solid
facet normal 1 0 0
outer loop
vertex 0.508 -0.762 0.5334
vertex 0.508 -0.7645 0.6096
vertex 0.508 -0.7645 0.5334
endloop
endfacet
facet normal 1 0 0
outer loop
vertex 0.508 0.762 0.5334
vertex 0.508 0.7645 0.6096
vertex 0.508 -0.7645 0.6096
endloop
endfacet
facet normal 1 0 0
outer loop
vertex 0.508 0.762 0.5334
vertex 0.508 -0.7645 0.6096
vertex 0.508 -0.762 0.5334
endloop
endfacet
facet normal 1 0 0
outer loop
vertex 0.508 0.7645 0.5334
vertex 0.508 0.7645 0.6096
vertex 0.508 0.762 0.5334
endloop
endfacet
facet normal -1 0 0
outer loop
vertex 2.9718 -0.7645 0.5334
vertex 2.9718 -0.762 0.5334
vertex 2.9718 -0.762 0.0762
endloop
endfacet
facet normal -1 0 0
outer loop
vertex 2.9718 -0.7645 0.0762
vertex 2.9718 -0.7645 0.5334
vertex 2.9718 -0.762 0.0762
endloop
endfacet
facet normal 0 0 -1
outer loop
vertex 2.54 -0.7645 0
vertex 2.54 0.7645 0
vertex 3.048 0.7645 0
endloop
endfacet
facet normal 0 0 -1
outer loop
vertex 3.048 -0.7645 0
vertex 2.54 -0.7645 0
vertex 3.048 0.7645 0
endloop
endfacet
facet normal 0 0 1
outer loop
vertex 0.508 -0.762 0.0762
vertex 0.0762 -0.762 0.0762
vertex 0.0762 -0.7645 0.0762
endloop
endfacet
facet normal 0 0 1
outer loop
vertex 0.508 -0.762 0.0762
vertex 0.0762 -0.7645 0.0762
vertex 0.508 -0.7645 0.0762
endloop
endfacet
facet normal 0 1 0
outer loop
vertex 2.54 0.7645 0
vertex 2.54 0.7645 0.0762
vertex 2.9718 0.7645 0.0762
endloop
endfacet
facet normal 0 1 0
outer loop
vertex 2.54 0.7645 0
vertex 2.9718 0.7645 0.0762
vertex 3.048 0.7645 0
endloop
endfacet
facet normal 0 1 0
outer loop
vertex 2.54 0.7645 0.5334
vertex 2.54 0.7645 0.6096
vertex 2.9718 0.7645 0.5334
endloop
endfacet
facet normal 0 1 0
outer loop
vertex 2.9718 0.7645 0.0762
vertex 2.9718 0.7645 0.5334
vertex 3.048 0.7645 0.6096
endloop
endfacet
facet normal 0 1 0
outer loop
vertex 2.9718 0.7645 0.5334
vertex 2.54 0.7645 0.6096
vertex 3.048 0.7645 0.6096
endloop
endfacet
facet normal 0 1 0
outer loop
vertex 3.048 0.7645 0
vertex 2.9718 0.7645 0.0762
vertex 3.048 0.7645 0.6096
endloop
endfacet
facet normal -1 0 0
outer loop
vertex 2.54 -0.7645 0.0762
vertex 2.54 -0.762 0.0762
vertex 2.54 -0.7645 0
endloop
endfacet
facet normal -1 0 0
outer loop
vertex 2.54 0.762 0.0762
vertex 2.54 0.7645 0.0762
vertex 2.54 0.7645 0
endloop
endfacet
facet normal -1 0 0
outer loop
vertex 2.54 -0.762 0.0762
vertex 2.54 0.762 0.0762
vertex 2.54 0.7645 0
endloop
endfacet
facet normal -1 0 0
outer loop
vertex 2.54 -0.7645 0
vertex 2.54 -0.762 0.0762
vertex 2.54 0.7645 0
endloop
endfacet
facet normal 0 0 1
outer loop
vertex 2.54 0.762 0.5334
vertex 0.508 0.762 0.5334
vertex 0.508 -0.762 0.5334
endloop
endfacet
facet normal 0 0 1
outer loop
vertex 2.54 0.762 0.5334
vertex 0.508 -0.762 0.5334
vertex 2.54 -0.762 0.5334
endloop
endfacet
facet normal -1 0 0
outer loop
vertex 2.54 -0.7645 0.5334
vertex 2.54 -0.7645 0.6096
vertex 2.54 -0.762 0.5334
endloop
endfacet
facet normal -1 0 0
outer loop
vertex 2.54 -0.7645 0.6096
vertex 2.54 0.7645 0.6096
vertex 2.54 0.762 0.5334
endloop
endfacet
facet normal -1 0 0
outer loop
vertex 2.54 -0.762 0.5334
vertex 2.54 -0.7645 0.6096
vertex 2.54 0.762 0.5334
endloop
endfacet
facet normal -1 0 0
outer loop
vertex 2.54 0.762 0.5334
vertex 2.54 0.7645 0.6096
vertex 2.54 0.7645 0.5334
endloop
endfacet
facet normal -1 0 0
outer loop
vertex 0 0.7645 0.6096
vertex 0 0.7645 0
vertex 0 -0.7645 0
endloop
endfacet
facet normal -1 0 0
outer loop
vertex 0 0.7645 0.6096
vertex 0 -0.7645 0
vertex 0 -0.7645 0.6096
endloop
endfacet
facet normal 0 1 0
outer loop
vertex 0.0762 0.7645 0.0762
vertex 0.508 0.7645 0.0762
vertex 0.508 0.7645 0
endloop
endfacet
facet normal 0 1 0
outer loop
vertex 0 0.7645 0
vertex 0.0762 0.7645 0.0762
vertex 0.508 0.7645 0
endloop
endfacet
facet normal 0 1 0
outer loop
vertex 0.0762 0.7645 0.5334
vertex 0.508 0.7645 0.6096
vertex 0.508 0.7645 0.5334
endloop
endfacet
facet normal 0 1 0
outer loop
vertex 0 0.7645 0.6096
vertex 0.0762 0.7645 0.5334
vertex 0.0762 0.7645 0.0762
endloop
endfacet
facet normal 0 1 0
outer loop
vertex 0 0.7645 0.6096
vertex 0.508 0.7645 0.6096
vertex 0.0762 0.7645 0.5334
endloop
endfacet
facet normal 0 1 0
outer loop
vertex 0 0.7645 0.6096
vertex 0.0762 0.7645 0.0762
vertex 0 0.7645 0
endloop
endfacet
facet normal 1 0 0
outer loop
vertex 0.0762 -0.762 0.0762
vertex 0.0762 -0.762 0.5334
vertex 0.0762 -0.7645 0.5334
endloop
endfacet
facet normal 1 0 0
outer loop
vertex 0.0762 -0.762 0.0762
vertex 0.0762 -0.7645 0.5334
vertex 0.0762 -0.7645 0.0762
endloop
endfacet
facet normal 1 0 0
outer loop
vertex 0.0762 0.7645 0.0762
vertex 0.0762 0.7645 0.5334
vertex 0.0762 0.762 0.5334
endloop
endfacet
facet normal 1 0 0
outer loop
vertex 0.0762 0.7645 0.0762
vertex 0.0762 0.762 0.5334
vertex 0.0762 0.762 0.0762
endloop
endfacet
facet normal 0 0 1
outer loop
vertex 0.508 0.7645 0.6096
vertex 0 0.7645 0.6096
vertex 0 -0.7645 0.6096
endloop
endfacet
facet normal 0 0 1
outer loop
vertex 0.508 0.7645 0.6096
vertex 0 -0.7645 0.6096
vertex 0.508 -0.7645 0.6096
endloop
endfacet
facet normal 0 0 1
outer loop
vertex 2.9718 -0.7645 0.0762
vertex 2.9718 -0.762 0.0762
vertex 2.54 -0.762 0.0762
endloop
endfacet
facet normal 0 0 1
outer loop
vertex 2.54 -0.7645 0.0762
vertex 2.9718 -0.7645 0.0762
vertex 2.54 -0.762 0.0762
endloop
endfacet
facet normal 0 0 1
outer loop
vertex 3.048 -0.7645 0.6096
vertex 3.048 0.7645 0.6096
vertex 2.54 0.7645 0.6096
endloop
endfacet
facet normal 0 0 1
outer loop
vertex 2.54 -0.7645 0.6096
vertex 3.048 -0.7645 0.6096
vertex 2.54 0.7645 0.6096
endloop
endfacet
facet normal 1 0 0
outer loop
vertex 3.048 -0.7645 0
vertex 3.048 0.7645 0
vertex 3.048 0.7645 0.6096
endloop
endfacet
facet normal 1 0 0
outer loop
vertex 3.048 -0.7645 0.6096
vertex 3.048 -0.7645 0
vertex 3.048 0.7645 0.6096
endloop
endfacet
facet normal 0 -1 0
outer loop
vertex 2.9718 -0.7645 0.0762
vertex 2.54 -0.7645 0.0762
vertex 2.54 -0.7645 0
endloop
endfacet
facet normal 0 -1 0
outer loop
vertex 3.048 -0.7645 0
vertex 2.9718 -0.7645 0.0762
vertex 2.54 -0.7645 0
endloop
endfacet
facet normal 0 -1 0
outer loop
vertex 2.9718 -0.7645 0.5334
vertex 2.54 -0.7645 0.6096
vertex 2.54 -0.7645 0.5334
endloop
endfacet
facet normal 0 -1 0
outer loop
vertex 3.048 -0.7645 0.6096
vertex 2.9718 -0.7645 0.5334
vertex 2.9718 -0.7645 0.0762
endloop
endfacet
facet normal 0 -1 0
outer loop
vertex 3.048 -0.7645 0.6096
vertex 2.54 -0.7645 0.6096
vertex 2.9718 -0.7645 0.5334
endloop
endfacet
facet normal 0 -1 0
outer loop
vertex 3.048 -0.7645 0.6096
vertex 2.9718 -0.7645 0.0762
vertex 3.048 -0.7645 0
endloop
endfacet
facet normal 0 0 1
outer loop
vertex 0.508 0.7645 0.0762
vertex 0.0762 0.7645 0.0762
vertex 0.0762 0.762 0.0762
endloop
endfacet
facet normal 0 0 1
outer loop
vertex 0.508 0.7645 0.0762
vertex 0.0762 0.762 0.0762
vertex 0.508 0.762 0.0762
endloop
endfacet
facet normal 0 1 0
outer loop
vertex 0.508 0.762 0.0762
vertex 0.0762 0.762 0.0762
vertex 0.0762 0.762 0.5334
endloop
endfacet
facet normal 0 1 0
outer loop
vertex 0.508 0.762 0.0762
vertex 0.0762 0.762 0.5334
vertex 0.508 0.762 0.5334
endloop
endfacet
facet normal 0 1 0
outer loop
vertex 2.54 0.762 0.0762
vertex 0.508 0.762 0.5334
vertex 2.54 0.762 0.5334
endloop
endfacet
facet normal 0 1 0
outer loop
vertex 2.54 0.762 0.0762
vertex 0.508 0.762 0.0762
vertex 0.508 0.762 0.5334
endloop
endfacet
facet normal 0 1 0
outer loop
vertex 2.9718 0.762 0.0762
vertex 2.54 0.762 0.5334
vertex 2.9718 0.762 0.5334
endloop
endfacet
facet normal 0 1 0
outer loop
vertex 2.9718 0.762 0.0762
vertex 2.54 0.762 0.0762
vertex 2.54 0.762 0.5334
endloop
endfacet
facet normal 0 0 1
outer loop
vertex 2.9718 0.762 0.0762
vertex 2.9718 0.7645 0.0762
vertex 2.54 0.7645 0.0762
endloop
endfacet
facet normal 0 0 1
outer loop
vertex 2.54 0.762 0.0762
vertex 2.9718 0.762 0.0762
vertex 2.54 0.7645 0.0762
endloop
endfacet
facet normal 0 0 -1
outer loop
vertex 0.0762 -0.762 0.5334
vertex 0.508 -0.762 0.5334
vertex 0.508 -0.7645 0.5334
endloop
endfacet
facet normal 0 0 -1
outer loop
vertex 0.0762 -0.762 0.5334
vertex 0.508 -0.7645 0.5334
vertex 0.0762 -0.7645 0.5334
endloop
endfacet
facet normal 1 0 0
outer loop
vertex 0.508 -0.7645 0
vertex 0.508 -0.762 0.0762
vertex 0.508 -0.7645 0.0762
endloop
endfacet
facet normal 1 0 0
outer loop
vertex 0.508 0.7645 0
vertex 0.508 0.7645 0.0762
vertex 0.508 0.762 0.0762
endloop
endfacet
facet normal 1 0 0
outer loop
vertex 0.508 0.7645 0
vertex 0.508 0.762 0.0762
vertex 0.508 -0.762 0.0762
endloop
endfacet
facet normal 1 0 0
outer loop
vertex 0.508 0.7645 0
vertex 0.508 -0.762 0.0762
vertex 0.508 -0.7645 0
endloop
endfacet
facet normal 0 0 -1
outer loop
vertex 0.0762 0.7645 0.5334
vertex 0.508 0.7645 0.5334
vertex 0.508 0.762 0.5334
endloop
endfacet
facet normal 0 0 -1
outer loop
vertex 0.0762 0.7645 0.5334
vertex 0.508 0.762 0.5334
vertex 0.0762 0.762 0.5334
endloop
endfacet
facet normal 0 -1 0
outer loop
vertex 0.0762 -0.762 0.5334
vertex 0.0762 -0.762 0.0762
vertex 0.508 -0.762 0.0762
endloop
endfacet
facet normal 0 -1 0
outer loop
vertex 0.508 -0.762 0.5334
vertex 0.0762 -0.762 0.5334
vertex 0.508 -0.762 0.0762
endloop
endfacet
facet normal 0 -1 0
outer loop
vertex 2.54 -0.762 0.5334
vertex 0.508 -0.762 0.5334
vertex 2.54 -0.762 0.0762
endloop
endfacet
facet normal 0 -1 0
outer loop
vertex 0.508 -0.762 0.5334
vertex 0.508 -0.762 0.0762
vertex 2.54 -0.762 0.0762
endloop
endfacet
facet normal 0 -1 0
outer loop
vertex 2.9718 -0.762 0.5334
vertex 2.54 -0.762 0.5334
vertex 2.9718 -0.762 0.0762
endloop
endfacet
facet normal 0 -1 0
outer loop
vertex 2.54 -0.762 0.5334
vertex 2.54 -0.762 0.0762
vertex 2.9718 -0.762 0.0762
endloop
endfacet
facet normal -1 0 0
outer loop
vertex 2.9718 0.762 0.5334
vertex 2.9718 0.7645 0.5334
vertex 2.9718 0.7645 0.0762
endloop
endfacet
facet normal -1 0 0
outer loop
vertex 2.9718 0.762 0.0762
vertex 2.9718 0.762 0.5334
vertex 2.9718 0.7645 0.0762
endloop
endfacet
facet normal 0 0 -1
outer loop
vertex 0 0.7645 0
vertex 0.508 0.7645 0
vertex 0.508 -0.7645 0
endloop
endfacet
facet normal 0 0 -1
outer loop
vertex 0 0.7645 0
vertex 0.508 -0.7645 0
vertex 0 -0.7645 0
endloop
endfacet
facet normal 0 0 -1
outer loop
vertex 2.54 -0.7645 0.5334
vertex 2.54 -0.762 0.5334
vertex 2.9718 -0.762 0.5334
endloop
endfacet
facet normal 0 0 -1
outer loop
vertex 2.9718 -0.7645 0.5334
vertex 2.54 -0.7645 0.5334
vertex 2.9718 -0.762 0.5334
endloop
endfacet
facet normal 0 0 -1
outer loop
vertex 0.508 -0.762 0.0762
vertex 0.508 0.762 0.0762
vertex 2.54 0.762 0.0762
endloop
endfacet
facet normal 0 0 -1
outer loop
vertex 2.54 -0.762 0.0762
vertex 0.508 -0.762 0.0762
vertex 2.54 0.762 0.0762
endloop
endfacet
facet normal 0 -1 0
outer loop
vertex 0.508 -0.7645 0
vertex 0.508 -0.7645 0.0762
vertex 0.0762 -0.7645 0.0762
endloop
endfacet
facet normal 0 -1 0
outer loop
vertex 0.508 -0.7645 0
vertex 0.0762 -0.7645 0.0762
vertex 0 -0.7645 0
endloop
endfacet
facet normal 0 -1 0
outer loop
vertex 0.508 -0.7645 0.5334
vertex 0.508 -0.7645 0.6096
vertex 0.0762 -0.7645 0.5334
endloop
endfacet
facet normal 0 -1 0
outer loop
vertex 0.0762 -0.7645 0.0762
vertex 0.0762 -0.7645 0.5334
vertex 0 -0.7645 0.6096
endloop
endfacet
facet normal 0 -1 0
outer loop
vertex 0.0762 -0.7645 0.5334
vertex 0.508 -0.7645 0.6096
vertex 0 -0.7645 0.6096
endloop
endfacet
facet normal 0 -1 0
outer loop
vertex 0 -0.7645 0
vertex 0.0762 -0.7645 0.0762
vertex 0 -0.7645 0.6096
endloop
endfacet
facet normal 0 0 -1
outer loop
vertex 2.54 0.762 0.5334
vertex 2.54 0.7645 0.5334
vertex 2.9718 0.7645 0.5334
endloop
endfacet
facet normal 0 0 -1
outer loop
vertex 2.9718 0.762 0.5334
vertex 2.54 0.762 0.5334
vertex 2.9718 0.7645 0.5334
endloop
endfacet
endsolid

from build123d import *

# Parameters (mm, degrees)
SKETCH2_W           = 2.8956
SKETCH2_H           = 0.4572
BASE_EXTRUDE_DEPTH  = 0.762
BOSS_EXTRUDE8_DEPTH = 1.52908


with BuildPart() as part:
    # Sketch2 → Base-Extrude (new body, symmetric)
    with BuildSketch(Plane(origin=(0, 0, 0), x_dir=(1, 0, 0), z_dir=(0, 1, 0))):
        with Locations((1.524, -0.3048)):
            Rectangle(SKETCH2_W, SKETCH2_H)
    extrude(amount=BASE_EXTRUDE_DEPTH, both=True)

    # Sketch3 → Boss-Extrude8 (add)
    with BuildSketch(Plane(origin=(0, 0.76454, 0), x_dir=(-1, 0, 0), z_dir=(0, 1, 0))):
        Polygon((-0.508, 0.6096), (-0.508, 0.5334), (-0.0762, 0.5334), (-0.0762, 0.0762), (-0.508, 0.0762), (-0.508, 0), (0, 0), (0, 0.6096), align=None)
    boss_extrude8 = extrude(amount=-BOSS_EXTRUDE8_DEPTH)

    # Mirror5: Boss-Extrude8 across plane
    add(boss_extrude8.mirror(Plane(origin=(1.524, 0, 0), x_dir=(0, 0, 1), z_dir=(1, 0, 0))))


solid = part.part
